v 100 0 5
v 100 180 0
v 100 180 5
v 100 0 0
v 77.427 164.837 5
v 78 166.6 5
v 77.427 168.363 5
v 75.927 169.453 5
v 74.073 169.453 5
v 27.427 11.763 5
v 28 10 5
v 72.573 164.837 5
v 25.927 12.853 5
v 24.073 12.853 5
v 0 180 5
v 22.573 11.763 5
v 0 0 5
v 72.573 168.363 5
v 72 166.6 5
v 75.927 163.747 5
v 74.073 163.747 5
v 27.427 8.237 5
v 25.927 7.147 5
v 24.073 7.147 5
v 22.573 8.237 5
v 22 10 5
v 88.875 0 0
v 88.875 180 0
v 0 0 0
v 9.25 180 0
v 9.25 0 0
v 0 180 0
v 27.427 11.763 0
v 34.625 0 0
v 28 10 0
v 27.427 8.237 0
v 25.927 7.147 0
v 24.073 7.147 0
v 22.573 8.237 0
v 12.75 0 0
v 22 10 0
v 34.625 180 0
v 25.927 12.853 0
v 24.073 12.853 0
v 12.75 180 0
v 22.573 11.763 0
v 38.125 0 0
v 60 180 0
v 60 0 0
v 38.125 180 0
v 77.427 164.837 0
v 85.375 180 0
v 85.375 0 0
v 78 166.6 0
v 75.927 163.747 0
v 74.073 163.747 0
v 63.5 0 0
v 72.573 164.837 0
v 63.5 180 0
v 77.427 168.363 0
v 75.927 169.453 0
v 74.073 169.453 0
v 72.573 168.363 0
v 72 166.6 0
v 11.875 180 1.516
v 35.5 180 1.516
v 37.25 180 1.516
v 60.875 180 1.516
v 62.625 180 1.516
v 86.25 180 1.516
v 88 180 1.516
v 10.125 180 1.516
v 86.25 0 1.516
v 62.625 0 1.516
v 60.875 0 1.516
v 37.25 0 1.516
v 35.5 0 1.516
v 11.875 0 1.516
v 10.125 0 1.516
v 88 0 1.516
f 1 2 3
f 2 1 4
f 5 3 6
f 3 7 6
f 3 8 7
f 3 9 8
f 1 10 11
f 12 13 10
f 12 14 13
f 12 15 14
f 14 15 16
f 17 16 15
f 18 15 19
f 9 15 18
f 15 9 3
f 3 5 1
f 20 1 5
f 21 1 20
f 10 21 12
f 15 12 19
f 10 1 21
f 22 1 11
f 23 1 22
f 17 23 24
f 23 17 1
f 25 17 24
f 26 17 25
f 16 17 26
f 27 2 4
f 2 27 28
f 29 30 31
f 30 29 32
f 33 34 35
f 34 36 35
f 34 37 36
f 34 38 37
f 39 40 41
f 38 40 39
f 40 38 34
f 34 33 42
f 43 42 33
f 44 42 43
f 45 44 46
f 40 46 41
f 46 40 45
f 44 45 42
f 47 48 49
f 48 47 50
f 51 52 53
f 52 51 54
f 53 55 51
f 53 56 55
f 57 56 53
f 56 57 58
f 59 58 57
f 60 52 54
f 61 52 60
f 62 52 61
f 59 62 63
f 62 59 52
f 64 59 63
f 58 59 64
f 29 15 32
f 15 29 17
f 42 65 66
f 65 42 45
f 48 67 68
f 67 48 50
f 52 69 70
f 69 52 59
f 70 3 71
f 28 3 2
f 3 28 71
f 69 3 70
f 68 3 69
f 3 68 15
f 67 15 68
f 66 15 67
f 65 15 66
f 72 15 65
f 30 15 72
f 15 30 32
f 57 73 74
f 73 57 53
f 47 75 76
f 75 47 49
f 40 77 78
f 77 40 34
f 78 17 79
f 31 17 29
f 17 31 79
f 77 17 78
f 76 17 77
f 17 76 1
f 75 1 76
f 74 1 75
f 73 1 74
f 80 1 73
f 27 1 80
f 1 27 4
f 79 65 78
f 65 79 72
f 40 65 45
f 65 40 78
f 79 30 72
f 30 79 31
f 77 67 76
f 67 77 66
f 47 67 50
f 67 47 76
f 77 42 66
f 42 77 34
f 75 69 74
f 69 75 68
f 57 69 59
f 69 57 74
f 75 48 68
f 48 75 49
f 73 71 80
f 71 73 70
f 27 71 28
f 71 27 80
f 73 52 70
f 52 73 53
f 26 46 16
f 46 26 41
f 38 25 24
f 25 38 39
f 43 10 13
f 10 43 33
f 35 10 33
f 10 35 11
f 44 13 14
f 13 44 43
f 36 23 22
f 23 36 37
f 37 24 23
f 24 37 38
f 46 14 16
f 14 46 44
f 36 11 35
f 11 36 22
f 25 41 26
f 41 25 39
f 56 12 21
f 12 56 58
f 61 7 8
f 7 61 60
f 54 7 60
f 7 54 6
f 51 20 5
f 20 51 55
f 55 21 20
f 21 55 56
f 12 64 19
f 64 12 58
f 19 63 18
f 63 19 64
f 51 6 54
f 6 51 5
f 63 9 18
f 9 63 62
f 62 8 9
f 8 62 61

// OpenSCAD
//Thrustmaster T16000 Joystick mounting plate

//Used to mount a T16000 Joystick to a wire shelving rack used as a lap-basd HOTAS setup

// (C) CC BY-SA 2017 by Vincent S. Chernesky under a Creative Commons - Attribution - Sharealike License

StartPosition =11;// Adjust where the first wire is relative to the Y axis
wireSpacing=203/8;//Adjust to the distance between your wires, mine was a little more than 25mm between wires
PlateLength=180;//Length of Plate
PlateWidth=100;//Width of Plate
PlateHeight=5;//Height of Plate
WireDiameter=3.5;//Diameter of your wire, I added 1mm to the width of the wire (2.5mm) to add some 'give' to the fitment
HoleDiameter=6;//M6 screw diameter
union(){
    difference(){
        //Baseplate
        cube(size=[PlateWidth,PlateLength,PlateHeight],center=false);
        //First rod cutout
        rotate([90,0,0])
        translate([StartPosition,0,-PlateLength/2])
        cylinder(h=180,d=WireDiameter,center=true);
        //second rod cutout
        rotate([90,0,0])
        translate([StartPosition+wireSpacing,0,-PlateLength/2])
        cylinder(h=PlateLength,d=WireDiameter,center=true);
        //Third rod cutout
        rotate([90,0,0])
        translate([StartPosition+(2*wireSpacing),0,-PlateLength/2])
        cylinder(h=PlateLength,d=WireDiameter,center=true);
        //Fourth rod cutout
        rotate([90,0,0])
        translate([StartPosition+(3*wireSpacing),0,-PlateLength/2])
        cylinder(h=PlateLength,d=WireDiameter,center=true);
        //First Screw Hole
        translate([25,10,0])
        cylinder(h=PlateHeight,d=HoleDiameter,center=false);
        //Second Screw Hole
        translate([25+50,10+156.6,0])
        cylinder(h=PlateHeight,d=HoleDiameter,center=false);
        
    }
}
